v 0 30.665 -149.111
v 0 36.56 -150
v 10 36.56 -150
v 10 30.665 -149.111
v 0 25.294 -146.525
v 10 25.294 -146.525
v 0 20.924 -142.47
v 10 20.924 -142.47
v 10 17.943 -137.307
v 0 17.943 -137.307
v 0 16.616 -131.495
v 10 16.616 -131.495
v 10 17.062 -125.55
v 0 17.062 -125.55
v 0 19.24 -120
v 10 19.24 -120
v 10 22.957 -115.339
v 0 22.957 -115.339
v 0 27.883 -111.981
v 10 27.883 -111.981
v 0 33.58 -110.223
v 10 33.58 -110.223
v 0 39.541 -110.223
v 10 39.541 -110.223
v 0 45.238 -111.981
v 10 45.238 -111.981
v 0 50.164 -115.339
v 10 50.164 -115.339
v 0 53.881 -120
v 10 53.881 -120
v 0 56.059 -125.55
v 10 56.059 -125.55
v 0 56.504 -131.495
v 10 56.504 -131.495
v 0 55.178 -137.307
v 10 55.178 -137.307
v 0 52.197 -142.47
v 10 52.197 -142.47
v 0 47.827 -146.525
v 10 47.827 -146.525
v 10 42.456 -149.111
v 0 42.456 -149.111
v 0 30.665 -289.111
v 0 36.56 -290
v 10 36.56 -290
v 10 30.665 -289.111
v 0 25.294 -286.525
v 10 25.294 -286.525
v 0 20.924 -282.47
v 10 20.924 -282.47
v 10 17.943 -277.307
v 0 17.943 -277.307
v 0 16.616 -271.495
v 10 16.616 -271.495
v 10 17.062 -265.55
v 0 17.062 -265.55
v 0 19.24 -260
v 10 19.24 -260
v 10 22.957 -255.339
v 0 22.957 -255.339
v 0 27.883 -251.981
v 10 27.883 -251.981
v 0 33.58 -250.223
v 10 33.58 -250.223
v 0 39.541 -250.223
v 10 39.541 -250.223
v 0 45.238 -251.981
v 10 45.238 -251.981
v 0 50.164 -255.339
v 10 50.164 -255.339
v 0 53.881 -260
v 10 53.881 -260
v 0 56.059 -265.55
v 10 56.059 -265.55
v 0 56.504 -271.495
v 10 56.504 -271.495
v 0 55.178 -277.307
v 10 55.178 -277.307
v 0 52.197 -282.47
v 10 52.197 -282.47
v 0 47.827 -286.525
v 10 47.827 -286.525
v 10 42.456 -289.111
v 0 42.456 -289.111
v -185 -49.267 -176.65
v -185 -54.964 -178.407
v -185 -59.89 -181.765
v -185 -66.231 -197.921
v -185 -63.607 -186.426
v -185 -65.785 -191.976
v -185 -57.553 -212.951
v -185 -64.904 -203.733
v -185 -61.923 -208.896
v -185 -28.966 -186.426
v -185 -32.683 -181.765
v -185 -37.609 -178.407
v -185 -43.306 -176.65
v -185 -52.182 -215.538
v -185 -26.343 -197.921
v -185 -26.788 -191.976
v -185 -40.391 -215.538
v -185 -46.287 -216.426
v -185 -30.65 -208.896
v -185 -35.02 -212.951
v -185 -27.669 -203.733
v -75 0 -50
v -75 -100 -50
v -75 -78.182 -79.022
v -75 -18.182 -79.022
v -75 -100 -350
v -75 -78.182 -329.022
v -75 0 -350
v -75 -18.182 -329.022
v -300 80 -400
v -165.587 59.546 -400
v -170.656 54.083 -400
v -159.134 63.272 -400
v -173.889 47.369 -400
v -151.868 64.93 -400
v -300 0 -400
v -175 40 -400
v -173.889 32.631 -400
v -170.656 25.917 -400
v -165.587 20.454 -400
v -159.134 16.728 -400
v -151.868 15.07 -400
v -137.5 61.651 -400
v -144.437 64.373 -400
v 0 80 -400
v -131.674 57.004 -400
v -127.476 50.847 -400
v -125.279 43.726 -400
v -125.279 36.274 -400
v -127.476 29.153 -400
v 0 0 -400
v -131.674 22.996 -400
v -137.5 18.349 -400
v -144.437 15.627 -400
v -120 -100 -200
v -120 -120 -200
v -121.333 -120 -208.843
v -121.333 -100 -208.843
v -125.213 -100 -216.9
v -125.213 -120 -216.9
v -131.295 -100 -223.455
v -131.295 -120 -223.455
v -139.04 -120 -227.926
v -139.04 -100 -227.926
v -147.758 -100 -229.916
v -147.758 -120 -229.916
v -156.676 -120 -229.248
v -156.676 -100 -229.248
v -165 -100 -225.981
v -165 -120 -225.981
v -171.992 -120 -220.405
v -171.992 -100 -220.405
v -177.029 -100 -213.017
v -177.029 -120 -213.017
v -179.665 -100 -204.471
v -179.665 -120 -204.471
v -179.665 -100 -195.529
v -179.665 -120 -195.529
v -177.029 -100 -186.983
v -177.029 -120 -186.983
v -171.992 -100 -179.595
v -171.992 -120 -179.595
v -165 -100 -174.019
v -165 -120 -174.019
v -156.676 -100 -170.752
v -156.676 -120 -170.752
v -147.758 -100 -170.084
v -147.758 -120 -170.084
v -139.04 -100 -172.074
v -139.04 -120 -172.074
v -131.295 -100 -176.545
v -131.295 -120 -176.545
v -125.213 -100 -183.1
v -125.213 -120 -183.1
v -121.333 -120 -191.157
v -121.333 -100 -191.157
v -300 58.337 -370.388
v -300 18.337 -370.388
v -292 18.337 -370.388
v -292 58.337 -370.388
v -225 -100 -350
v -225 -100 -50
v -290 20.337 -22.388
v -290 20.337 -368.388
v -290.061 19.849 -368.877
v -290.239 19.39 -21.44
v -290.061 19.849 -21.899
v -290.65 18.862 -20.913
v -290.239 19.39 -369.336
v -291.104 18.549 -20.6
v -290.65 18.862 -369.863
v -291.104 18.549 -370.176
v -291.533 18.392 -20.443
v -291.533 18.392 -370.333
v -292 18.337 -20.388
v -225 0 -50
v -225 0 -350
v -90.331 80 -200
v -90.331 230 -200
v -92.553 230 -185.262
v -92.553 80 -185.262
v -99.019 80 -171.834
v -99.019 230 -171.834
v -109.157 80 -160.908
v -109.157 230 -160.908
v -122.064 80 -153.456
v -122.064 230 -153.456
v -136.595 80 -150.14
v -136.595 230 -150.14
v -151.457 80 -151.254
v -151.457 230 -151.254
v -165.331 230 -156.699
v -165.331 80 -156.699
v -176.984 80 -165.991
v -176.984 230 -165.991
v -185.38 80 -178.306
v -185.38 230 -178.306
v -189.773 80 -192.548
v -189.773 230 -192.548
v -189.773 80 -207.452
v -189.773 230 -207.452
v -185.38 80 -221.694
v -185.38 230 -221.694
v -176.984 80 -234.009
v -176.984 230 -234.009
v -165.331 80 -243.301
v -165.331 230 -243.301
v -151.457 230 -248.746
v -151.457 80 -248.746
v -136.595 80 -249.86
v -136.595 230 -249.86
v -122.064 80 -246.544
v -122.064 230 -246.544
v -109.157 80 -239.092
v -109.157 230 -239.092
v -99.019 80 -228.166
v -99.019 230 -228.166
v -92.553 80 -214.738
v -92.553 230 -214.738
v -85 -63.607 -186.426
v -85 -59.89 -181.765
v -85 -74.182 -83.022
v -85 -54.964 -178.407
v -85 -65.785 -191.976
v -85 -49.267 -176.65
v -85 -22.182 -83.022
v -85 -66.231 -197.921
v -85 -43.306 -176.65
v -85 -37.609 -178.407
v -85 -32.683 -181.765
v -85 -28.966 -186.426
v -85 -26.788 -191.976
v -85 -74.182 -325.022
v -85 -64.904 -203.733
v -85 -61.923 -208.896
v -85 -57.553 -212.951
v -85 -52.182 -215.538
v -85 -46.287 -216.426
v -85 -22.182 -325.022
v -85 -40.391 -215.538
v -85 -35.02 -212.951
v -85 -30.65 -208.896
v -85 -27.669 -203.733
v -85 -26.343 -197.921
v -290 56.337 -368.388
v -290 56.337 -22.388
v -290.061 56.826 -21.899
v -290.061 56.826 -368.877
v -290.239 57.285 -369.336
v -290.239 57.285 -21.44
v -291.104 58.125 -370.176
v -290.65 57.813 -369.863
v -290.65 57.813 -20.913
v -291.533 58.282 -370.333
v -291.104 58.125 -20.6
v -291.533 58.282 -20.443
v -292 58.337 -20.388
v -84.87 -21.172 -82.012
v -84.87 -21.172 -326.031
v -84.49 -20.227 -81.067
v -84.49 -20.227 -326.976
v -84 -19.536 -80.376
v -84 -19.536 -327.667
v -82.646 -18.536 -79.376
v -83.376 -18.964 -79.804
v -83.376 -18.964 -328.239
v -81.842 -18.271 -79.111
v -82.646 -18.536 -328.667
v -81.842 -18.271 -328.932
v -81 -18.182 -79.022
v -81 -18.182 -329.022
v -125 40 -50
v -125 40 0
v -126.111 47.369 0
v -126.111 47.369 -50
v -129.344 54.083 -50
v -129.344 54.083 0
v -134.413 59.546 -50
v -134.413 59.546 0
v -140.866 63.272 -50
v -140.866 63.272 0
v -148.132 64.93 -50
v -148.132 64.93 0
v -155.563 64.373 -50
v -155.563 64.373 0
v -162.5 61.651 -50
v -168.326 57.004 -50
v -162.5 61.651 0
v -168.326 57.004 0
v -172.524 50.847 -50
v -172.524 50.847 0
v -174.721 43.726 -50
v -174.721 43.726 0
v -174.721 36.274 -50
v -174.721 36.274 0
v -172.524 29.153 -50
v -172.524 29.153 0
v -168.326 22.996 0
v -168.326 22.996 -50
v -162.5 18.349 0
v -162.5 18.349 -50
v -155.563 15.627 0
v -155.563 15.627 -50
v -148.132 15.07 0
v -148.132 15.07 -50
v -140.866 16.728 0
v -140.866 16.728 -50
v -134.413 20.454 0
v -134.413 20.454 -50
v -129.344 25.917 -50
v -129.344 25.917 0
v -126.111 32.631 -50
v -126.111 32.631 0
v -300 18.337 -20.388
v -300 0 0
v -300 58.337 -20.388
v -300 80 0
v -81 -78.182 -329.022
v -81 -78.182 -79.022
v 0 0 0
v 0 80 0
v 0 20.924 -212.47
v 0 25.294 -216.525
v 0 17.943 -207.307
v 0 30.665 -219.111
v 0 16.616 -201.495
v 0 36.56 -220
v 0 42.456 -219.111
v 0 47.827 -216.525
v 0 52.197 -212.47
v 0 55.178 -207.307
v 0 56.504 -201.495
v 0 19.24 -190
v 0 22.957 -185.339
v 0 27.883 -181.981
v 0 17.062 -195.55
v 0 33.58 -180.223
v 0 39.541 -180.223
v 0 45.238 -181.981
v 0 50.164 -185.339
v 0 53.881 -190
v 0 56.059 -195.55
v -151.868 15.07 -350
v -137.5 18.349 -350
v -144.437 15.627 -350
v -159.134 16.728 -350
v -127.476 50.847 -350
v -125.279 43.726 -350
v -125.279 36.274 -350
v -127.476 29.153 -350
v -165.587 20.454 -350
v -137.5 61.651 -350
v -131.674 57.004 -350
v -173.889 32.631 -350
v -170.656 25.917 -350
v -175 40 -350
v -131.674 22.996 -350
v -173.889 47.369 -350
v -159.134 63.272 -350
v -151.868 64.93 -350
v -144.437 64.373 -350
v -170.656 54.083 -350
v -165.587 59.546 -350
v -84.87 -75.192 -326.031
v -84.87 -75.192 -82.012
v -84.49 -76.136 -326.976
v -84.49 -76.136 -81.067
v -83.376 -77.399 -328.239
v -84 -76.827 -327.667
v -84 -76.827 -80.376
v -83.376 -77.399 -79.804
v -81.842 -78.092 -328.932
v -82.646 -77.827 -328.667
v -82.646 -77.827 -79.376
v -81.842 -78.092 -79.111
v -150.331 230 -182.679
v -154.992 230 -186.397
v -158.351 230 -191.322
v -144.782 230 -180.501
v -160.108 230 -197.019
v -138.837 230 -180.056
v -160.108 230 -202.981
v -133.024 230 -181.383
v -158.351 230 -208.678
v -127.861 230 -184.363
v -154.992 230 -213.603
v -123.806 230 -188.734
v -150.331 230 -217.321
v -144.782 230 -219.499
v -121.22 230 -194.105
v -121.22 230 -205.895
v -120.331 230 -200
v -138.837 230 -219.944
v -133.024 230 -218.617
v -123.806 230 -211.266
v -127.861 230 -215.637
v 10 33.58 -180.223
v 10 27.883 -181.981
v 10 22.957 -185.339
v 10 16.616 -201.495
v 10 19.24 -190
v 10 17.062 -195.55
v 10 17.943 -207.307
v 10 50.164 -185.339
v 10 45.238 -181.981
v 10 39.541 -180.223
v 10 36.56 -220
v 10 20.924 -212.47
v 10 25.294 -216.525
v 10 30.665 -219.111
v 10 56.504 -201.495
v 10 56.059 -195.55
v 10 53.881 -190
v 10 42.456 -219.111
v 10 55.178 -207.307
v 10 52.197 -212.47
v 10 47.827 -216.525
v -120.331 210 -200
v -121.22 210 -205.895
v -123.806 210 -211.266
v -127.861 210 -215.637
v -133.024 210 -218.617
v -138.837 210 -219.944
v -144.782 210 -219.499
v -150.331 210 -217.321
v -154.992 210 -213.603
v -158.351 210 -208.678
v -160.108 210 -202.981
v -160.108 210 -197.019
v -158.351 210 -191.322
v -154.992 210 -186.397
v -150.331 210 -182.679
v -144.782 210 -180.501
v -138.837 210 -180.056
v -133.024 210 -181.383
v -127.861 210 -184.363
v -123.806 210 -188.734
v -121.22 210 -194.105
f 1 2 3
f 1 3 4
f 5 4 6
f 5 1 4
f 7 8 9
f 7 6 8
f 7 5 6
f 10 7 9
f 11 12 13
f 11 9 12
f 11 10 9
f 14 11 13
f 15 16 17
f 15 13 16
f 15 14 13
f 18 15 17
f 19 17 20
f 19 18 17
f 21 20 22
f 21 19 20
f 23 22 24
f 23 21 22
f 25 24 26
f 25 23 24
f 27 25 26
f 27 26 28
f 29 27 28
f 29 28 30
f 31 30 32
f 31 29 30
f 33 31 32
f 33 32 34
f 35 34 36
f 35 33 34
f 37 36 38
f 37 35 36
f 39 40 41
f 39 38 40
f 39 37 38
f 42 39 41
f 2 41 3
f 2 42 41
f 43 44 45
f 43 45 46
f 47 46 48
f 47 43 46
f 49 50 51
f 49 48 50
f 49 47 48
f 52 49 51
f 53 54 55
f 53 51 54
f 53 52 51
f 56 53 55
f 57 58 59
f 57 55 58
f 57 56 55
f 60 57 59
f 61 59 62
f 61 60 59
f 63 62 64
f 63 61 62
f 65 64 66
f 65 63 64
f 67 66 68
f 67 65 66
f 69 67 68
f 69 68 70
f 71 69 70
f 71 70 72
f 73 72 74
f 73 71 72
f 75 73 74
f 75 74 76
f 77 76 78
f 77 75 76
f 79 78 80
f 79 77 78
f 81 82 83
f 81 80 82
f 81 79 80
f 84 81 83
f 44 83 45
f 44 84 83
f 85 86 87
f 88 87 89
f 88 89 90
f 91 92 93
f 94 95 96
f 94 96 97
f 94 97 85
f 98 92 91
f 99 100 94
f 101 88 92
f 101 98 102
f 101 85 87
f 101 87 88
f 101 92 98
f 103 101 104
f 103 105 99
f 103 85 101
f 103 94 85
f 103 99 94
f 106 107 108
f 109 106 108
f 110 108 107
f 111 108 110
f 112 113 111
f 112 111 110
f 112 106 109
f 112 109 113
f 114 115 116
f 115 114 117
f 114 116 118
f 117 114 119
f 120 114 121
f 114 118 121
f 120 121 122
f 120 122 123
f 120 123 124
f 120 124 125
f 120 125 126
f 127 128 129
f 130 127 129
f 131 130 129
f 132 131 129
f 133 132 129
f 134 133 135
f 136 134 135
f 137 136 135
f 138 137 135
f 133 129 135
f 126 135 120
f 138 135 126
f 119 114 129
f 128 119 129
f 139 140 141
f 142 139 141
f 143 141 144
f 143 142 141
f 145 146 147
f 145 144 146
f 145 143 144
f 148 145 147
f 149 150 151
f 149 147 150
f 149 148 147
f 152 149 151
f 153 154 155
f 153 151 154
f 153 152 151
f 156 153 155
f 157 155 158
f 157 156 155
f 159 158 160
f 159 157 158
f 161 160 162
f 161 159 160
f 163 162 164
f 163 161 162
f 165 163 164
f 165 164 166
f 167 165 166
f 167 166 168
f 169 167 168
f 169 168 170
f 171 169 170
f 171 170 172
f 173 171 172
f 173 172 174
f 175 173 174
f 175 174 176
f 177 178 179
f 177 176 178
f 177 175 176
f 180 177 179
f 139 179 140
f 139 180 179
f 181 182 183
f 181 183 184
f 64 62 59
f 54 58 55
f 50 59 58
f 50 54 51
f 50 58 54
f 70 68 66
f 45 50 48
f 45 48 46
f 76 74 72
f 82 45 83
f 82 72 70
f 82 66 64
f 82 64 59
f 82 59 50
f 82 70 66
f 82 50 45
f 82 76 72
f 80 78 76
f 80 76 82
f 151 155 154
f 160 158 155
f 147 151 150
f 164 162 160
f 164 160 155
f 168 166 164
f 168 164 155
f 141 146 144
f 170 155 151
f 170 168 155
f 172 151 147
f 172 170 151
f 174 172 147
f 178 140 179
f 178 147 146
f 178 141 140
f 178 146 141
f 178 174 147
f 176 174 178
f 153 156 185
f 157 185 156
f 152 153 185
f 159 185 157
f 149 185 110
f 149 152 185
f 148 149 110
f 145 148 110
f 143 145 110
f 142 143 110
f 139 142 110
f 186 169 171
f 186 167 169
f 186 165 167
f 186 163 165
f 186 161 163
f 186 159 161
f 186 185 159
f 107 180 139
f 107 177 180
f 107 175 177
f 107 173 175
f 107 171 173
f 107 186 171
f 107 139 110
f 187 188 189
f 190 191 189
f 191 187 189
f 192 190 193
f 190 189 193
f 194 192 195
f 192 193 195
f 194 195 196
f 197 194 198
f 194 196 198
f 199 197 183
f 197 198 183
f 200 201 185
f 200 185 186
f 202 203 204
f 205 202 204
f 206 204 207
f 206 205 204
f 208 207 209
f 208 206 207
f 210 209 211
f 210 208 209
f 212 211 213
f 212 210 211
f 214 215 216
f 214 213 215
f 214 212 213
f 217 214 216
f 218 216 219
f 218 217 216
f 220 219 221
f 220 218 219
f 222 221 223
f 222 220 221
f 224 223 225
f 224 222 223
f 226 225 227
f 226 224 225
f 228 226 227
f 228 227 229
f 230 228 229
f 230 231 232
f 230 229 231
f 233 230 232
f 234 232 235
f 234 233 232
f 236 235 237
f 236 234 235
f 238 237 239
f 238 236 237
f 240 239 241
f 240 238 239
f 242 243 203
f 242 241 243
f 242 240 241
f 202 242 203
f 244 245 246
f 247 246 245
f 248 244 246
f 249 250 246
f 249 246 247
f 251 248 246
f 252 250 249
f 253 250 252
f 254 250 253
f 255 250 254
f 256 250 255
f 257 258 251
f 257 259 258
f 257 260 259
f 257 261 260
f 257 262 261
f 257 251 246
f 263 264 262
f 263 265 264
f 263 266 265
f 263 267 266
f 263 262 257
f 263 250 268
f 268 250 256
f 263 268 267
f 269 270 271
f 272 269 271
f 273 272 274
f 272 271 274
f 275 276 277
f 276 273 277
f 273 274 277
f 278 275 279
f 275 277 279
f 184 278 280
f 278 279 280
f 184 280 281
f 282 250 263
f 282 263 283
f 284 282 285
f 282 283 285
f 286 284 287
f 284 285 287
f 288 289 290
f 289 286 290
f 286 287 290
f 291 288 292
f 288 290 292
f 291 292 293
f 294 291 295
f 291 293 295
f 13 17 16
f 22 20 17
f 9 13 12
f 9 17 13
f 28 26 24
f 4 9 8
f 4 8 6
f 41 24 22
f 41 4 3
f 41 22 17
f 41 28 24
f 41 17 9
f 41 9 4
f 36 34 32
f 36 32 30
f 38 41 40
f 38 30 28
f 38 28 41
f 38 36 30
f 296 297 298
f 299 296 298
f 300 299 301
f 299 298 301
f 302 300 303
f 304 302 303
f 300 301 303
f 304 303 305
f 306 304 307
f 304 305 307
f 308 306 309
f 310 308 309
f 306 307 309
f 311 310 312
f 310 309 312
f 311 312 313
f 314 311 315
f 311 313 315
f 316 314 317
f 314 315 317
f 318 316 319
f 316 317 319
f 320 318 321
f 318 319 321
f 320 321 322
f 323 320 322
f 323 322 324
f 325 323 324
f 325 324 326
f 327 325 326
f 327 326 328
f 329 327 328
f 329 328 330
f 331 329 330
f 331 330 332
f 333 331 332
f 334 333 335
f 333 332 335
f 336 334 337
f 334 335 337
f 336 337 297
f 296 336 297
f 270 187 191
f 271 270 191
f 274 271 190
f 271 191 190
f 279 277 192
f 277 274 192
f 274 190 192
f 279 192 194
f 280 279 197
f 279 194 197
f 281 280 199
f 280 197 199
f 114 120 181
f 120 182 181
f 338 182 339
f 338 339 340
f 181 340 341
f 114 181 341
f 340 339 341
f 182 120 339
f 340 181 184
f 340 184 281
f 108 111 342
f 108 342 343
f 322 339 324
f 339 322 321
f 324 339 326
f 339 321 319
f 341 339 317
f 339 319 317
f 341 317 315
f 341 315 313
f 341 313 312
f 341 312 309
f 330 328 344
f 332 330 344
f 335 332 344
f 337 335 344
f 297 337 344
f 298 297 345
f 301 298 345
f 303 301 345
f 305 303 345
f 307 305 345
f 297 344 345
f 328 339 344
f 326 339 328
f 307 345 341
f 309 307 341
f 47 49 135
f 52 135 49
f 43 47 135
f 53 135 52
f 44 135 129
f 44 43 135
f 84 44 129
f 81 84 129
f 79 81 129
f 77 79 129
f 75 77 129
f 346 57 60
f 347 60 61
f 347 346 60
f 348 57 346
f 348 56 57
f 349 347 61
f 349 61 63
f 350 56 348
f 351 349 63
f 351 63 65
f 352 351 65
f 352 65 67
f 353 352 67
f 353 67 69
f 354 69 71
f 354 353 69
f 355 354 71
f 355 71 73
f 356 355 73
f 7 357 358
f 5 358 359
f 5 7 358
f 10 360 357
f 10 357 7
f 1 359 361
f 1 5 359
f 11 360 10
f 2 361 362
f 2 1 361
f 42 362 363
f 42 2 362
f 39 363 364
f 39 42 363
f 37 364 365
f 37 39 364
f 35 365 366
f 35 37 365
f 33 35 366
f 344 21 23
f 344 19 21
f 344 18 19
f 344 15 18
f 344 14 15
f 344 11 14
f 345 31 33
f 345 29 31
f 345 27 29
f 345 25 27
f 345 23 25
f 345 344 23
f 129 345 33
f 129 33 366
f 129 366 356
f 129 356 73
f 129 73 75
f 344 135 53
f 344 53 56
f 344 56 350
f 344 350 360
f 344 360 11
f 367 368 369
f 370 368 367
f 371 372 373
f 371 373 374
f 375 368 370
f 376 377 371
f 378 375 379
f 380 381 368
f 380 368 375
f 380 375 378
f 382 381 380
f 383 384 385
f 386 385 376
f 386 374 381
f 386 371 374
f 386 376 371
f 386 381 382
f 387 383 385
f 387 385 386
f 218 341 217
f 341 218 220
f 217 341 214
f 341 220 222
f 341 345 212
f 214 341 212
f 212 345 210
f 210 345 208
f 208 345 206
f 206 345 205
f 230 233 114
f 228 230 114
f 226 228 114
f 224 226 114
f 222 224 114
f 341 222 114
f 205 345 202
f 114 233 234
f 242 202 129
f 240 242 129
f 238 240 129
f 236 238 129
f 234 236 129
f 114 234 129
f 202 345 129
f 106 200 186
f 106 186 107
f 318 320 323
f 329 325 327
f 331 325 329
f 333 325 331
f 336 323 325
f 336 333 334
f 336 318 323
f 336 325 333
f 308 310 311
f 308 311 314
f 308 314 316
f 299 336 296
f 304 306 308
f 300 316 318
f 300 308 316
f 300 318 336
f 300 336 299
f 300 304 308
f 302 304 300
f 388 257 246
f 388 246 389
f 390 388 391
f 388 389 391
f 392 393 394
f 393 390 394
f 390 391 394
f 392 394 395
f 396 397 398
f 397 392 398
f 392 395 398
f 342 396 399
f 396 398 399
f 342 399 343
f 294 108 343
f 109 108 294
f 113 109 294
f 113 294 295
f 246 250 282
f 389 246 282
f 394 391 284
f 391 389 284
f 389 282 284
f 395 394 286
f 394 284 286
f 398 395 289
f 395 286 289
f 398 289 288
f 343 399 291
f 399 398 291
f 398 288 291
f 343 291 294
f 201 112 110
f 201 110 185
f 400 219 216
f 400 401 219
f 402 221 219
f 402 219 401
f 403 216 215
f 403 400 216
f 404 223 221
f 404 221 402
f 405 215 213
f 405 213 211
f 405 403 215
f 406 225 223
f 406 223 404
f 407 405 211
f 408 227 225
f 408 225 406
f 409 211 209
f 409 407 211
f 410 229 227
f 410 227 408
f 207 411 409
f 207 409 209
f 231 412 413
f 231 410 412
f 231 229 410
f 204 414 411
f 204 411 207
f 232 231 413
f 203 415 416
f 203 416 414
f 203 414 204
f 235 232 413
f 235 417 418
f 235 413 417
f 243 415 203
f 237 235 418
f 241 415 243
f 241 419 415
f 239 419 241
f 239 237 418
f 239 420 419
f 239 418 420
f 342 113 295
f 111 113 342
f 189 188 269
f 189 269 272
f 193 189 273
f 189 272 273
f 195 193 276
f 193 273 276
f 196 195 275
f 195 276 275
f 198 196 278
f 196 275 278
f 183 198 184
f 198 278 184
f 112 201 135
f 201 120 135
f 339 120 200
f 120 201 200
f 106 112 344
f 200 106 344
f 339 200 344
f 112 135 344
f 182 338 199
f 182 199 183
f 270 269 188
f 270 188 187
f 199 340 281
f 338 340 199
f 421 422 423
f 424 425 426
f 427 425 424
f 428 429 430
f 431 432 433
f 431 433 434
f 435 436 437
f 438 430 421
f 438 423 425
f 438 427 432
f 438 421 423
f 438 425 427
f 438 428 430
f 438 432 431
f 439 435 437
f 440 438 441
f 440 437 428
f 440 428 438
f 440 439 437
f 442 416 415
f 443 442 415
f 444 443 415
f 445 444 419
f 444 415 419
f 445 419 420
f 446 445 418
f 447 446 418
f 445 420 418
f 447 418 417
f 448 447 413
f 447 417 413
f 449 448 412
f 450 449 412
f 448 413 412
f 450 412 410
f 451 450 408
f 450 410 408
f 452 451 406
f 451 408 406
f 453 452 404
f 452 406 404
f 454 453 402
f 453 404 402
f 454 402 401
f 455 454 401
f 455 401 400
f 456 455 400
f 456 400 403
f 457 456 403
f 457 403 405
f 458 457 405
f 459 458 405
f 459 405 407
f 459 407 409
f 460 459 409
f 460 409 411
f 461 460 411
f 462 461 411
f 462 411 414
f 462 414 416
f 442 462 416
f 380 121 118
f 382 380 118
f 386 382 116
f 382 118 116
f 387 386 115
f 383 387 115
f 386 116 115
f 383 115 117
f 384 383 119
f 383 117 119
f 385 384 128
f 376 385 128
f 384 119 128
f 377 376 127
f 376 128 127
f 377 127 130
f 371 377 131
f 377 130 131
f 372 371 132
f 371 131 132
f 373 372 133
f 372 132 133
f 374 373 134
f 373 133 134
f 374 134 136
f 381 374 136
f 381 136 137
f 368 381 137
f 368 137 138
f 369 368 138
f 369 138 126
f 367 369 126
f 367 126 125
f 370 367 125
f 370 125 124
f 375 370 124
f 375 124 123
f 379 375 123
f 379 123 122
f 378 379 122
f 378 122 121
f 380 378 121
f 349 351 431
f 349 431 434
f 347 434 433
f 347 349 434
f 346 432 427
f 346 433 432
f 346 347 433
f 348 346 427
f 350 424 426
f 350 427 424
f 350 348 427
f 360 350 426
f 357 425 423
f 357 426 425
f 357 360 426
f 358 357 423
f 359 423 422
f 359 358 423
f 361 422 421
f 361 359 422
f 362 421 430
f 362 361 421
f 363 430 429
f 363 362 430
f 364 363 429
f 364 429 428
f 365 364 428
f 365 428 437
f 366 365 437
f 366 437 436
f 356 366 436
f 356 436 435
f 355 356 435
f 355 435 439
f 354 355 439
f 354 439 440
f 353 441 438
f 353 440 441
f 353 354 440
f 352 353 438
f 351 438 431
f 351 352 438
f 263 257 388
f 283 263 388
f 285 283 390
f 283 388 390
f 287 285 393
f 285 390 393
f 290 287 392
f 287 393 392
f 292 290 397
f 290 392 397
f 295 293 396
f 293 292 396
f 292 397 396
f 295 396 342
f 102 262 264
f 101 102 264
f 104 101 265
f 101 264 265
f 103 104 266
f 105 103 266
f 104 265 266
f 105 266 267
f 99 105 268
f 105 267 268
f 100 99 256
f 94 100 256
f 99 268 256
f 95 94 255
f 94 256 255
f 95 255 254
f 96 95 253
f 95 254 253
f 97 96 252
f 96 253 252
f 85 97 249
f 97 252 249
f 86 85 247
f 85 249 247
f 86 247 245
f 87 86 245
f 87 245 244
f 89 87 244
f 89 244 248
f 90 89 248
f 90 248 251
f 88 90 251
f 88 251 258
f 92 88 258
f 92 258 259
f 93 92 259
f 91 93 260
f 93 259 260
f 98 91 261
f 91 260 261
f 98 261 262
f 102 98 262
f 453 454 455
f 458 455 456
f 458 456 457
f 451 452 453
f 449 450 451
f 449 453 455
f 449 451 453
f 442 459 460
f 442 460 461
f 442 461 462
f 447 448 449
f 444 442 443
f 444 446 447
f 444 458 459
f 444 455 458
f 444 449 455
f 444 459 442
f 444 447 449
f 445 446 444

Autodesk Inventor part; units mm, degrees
ref_plane "YZ Plane" through (0, 0, 0) normal (1, 0, 0) x (0, 1, 0)
ref_plane "XZ Plane" through (0, 0, 0) normal (0, 1, 0) x (-1, 0, 0)
ref_plane "XY Plane" through (0, 0, 0) normal (0, 0, 1) x (1, 0, 0)
sketch "Sketch1" plane through (0, 0, 0) normal (1, 0, 0) x (0, 1, 0)
  line L0 (0, 0) -> (80, 0)
  line L1 (80, 0) -> (80, -400)
  line L2 (80, -400) -> (0, -400)
  line L3 (0, -400) -> (0, 0)
  dimension "d0" = 80
  dimension "d1" = 400
extrude "Extrusion1" add sketch "Sketch1" against normal blind 300
sketch "Sketch2" plane through (0, 0, 0) normal (1, 0, 0) x (0, 0, -1)
  circle A0 centre (130, 36.5604) radius 20
  circle A1 centre (200, 36.5604) radius 20
  circle A2 centre (270, 36.5604) radius 20
  line L0 (0, 80) -> (0, 0) projected
  line L1 (400, 0) -> (400, 80) projected
  dimension "d4" = 40
  dimension "d5" = 40
  dimension "d6" = 40
  dimension "d7" = 130
  dimension "d8" = 130
  dimension "d9" = 70
extrude "Extrusion2" add sketch "Sketch2" along normal blind 10 contours A0
extrude "Extrusion3" add sketch "Sketch2" along normal blind 10 contours A1
extrude "Extrusion4" add sketch "Sketch2" along normal blind 10 contours A2
sketch "Sketch3" plane through (0, 80, 0) normal (0, 1, 0) x (1, 0, 0)
  circle A0 centre (-140.3312, 200) radius 50
  line L0 (0, 0) -> (-300, 0) projected
  dimension "d16" = 100
  dimension "d17" = 200
extrude "Extrusion5" add sketch "Sketch3" along normal blind 150
sketch "Sketch4" plane through (-140.3312, 230, -200) normal (0, 1, 0) x (1, 0, 0)
  circle A0 centre (0, 0) radius 20
  point P0 (140.3312, -200)
  dimension "d20" = 40
extrude "Extrusion6" cut sketch "Sketch4" against normal blind 20
sketch "Sketch5" plane through (0, 0, -400) normal (0, -1, 0) x (1, 0, 0)
  line L0 (-75, 350) -> (-75, 50)
  line L1 (-75, 50) -> (-225, 50)
  line L2 (-225, 50) -> (-225, 350)
  line L3 (-225, 350) -> (-75, 350)
  line L4 (0, 400) -> (0, 0) projected
  line L5 (0, 0) -> (-300, 0) projected
  dimension "d23" = 300
  dimension "d24" = 150
  dimension "d25" = 300
  dimension "d26" = 75
  dimension "d27" = 50
sketch "Sketch6" plane through (0, 0, -400) normal (0, -1, 0) x (1, 0, 0)
  point P0 (0, 400)
extrude "Extrusion7" add sketch "Sketch5" along normal blind 100
sketch "Sketch7" plane through (0, -100, -400) normal (0, -1, 0) x (1, 0, 0)
  circle A0 centre (-150, 200) radius 30
  line L0 (-225, 50) -> (-75, 50) projected
  line L1 (-75, 50) -> (-75, 350) projected
  point P0 (0, 400)
  dimension "d30" = 60
  dimension "d31" = 150
  dimension "d32" = 75
extrude "Extrusion8" add sketch "Sketch7" along normal blind 20
sketch "Sketch8" plane through (-150, -120, -200) normal (0, -1, 0) x (1, 0, 0)
  point P0 (150, 200)
sketch "Sketch9" plane through (0, 0, 0) normal (0, 0, 1) x (1, 0, 0)
  circle A0 centre (-150, 40) radius 25
  line L0 (-300, 0) -> (-300, 80) projected
  line L1 (0, 80) -> (-300, 80) projected
  point P0 (0, 0)
  dimension "d35" = 50
  dimension "d36" = 150
  dimension "d37" = 40
extrude "Extrusion9" cut sketch "Sketch9" against normal blind 50
sketch "Sketch10" plane through (0, 0, -400) normal (0, 0, -1) x (-1, 0, 0)
  circle A0 centre (150, 40) radius 25 projected
  circle A1 centre (150, 40) radius 25
  point P0 (0, 0)
extrude "Extrusion10" cut sketch "Sketch10" against normal blind 50
sketch "Sketch11" plane through (-75, 0, -50) normal (1, 0, 0) x (0, 0, -1)
  line L0 (29.0215, -18.1816) -> (279.0215, -18.1816)
  line L1 (279.0215, -18.1816) -> (279.0215, -78.1816)
  line L2 (279.0215, -78.1816) -> (29.0215, -78.1816)
  line L3 (29.0215, -78.1816) -> (29.0215, -18.1816)
  point P0 (-50, 0)
  dimension "d42" = 250
  dimension "d43" = 60
extrude "Extrusion11" cut sketch "Sketch11" against normal blind 10
fillet "Fillet1" radius 4 4 edges at (-85, -48.1816, -329.0215) (-85, -18.1816, -204.0215) (-85, -78.1816, -204.0215) (-85, -48.1816, -79.0215)
sketch "Sketch12" plane through (-300, 0, 0) normal (-1, 0, 0) x (0, 0, 1)
  line L0 (-20.388, 18.3372) -> (-370.388, 18.3372)
  line L1 (-370.388, 18.3372) -> (-370.388, 58.3372)
  line L2 (-370.388, 58.3372) -> (-20.388, 58.3372)
  line L3 (-20.388, 58.3372) -> (-20.388, 18.3372)
  point P0 (0, 0)
  dimension "d47" = 350
  dimension "d48" = 40
extrude "Extrusion12" cut sketch "Sketch12" against normal blind 10
fillet "Fillet2" radius 2 4 edges at (-290, 18.3372, -195.388) (-290, 38.3372, -370.388) (-290, 38.3372, -20.388) (-290, 58.3372, -195.388)
sketch "Sketch13" plane through (-85, 0, -50) normal (1, 0, 0) x (0, 0, -1)
  circle A0 centre (146.4262, -46.2866) radius 20
  point P0 (-50, 0)
  dimension "d52" = 40
extrude "Extrusion13" cut sketch "Sketch13" against normal blind 100
